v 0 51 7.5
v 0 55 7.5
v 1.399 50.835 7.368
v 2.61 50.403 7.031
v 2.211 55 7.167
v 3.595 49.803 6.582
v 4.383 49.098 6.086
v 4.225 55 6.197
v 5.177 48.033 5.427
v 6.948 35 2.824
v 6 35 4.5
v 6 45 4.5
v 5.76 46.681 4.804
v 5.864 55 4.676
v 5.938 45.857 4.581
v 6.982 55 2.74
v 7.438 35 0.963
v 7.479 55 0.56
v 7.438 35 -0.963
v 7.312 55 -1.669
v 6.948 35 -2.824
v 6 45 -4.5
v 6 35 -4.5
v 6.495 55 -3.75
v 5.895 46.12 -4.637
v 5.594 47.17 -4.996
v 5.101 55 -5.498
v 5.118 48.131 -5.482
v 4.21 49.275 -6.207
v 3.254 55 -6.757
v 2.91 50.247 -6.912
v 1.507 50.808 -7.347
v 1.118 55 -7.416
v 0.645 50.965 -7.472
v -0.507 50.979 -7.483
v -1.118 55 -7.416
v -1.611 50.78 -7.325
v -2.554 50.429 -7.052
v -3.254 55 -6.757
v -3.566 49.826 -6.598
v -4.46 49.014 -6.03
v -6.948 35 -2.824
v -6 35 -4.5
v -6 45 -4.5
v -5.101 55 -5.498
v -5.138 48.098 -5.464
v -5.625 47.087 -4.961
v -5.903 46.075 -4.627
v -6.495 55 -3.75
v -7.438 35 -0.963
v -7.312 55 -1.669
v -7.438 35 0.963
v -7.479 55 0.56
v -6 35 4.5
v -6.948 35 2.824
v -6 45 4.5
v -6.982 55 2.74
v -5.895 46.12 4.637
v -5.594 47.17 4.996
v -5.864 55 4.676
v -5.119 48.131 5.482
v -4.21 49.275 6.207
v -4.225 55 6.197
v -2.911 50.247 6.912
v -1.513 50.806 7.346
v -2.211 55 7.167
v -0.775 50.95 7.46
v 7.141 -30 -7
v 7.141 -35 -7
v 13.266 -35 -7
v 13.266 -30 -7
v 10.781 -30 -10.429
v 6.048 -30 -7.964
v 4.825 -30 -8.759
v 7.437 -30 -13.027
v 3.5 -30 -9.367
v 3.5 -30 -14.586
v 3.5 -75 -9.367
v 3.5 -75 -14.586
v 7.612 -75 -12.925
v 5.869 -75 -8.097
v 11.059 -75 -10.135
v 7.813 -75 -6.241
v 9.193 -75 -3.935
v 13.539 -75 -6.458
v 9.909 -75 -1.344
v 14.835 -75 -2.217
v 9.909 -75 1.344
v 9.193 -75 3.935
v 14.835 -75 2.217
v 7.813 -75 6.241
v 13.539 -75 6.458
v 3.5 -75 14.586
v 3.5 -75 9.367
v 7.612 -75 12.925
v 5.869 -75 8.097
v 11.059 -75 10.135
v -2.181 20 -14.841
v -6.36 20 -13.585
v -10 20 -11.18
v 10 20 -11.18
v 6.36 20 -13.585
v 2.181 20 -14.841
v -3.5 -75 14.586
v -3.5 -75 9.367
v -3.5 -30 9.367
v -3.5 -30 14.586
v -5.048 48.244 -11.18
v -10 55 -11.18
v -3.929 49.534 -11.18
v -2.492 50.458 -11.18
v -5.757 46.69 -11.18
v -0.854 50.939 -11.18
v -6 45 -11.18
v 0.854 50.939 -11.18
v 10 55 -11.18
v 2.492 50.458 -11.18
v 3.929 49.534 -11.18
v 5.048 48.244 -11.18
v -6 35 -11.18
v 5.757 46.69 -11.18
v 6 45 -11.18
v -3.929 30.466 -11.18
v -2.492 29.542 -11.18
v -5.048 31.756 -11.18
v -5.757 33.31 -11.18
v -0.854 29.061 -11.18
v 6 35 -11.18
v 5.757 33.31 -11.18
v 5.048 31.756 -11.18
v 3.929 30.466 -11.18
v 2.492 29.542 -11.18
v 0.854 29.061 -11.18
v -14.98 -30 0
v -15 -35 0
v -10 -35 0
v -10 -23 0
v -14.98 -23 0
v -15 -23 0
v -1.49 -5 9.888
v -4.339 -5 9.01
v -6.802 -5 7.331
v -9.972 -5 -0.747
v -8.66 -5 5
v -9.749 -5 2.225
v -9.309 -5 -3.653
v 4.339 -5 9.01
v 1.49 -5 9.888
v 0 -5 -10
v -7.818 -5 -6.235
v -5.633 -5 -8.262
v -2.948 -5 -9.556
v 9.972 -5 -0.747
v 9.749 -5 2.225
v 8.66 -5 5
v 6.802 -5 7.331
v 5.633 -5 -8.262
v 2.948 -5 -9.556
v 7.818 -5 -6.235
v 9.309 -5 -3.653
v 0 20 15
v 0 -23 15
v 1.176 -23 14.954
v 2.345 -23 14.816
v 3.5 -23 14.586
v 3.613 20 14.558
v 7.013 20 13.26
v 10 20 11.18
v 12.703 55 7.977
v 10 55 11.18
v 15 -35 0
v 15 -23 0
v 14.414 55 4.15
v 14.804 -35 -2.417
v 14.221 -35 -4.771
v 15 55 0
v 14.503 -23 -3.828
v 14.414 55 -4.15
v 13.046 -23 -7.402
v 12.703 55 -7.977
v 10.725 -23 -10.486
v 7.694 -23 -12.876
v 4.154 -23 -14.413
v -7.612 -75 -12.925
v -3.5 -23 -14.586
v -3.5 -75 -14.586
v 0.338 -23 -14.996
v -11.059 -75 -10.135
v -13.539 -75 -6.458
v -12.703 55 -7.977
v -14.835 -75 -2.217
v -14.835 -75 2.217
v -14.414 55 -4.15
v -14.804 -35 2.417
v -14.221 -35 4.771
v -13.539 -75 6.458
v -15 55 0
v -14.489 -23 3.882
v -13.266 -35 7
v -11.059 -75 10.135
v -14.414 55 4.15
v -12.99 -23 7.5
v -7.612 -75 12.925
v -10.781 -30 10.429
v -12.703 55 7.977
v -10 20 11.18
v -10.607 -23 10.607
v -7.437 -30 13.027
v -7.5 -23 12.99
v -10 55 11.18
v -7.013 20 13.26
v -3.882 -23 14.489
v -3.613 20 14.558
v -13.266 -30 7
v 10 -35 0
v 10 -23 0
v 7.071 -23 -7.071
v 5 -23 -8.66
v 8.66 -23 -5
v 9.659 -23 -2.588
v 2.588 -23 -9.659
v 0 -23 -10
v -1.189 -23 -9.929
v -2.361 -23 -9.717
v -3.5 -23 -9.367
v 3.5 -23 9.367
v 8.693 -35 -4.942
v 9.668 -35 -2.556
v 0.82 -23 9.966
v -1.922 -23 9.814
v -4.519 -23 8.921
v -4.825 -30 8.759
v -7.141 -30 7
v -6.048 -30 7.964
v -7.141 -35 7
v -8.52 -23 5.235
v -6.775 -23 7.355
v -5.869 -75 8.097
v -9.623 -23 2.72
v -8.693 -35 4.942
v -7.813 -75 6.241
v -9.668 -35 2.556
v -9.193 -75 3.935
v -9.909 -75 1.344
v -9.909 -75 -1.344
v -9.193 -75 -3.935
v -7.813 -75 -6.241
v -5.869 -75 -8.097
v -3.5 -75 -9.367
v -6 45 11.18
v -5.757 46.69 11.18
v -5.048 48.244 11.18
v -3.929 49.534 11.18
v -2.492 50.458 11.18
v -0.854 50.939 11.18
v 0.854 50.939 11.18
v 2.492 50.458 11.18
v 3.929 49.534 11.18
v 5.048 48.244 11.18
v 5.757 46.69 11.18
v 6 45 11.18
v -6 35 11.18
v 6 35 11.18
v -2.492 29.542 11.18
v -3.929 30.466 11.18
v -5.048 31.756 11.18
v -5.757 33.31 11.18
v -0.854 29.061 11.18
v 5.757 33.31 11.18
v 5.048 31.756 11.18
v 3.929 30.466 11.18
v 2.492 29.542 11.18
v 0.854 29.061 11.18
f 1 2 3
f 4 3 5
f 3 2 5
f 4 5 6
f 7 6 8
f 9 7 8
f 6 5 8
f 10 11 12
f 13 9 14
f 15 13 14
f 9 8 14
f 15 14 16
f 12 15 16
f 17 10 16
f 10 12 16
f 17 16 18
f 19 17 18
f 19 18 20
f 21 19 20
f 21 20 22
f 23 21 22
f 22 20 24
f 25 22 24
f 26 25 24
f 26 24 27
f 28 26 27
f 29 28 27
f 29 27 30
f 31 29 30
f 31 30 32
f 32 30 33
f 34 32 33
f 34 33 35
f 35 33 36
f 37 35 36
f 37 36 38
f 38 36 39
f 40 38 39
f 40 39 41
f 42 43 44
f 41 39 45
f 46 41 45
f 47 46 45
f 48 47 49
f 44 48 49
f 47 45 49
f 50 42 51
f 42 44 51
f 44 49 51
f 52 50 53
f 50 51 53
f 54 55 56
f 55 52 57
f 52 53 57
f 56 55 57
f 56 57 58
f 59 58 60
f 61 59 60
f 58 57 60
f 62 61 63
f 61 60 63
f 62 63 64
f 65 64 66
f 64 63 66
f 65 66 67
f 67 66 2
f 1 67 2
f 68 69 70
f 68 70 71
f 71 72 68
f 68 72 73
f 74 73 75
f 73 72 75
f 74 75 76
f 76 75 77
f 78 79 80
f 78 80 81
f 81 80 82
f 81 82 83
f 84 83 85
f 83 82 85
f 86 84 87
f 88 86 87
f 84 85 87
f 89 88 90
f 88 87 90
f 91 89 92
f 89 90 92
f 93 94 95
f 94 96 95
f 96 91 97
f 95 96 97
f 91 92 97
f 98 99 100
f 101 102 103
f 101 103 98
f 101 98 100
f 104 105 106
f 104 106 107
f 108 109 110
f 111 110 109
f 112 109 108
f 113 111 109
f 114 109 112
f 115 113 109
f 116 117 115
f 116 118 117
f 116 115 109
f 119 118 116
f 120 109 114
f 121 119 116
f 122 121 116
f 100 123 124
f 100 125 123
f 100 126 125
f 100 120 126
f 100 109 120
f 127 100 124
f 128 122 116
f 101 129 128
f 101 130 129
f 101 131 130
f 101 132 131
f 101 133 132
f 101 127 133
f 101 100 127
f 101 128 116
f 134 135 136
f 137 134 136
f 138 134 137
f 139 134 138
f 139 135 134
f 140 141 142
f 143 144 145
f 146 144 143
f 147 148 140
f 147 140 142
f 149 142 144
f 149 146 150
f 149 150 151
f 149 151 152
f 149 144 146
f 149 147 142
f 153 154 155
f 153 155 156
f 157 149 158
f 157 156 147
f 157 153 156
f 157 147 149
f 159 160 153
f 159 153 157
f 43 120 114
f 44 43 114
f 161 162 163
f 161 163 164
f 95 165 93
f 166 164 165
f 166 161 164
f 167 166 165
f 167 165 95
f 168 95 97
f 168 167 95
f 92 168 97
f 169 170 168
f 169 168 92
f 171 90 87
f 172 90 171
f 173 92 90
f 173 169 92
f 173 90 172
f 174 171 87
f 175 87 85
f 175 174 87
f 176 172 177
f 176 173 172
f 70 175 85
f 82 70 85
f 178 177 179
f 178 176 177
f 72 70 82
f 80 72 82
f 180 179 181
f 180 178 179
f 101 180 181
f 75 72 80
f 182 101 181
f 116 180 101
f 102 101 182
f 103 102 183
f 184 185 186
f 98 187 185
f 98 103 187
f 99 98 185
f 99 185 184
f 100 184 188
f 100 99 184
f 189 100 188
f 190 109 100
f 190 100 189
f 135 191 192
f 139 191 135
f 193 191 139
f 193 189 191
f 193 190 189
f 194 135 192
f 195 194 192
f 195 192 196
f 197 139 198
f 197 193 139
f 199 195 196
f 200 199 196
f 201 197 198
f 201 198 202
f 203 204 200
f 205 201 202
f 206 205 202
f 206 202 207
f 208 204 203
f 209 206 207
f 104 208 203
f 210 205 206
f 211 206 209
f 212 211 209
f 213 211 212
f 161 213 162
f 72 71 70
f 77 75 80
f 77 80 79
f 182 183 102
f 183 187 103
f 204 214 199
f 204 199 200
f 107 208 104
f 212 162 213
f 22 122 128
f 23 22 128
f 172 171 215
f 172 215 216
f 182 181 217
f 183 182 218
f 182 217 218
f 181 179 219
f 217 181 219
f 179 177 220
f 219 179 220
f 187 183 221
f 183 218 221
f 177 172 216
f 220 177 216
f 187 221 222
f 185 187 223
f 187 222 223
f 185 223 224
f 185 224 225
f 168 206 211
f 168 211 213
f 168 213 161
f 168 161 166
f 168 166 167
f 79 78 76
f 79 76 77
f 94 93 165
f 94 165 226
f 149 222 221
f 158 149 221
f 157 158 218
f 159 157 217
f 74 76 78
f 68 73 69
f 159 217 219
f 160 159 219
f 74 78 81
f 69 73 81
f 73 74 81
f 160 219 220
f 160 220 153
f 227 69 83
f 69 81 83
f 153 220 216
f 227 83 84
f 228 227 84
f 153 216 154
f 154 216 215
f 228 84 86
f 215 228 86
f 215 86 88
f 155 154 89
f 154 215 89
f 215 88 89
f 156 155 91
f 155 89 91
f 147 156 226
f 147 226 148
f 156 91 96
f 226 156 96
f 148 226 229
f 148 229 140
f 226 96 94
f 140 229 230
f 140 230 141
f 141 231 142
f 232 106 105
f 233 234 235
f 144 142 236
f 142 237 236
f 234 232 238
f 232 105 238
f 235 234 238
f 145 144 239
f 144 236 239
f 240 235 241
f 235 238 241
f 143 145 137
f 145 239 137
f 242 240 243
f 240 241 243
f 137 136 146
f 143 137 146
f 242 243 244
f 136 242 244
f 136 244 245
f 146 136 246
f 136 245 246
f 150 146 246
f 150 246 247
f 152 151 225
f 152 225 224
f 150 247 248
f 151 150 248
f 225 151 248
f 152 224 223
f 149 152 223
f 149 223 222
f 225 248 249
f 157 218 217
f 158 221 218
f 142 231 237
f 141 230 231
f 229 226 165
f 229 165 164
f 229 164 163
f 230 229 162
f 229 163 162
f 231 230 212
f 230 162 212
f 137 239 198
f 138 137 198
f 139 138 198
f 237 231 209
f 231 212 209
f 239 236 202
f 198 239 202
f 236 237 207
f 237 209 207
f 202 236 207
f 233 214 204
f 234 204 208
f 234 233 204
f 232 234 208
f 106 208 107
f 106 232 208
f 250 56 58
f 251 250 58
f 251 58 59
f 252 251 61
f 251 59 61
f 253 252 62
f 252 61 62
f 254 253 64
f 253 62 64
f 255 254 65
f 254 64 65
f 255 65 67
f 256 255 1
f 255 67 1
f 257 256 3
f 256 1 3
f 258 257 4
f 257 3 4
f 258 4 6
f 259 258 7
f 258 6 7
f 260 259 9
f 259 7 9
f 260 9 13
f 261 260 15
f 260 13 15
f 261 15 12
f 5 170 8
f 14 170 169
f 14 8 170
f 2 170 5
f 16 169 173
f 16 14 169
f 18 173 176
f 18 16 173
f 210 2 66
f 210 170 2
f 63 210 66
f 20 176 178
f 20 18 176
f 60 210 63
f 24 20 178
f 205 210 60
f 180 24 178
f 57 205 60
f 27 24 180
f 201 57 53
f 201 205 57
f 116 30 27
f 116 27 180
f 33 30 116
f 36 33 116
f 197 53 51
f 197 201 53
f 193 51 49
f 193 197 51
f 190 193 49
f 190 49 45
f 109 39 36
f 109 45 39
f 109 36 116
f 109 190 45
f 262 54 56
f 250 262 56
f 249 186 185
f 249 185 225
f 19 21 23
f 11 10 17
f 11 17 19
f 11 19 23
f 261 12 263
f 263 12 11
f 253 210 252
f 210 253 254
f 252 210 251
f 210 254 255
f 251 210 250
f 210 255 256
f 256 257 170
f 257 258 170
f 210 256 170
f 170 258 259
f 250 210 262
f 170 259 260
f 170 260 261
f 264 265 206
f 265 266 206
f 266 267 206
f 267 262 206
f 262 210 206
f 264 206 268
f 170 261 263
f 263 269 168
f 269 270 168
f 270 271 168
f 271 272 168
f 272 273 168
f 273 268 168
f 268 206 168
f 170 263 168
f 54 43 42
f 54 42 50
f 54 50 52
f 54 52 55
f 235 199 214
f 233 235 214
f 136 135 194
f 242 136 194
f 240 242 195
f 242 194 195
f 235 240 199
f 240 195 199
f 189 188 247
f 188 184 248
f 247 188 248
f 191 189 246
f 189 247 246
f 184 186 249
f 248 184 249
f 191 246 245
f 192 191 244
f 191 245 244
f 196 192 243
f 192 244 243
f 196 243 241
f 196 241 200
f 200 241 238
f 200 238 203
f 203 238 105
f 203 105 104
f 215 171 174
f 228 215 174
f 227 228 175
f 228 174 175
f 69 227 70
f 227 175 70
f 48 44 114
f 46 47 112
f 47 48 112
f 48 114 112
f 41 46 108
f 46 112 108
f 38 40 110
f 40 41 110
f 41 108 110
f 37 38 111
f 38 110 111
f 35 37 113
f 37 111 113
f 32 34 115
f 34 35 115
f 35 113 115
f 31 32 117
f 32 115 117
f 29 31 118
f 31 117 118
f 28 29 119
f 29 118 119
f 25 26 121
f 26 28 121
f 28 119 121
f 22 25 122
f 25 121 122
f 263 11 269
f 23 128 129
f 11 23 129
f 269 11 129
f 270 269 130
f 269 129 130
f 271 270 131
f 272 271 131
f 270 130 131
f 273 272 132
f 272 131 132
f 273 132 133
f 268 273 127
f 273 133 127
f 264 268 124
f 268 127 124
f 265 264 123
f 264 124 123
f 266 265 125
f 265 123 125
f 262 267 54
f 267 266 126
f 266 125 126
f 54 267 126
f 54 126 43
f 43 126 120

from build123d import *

# Parameters (mm, degrees)
SKETCH1_R                = 15
BOSS_EXTRUDE1_DEPTH      = 75
CUT_EXTRUDE1_DEPTH       = 52
CUT_EXTRUDE2_DEPTH       = 3.5
SKETCH9_R                = 10
CUT_EXTRUDE12_DEPTH      = 70
SKETCH17_W               = 7
SKETCH17_H               = 12
CUT_EXTRUDE19_DEPTH      = 15
SKETCH19_W               = 7
SKETCH19_H               = 12
CUT_EXTRUDE20_DEPTH      = 15
SKETCH20_R               = 7.5
CUT_EXTRUDE21_DEPTH      = 40
CUT_EXTRUDE25_DEPTH      = 152.492574075
CUT_EXTRUDE25_DEPTH_BACK = 55
SKETCH21_W               = 20
SKETCH21_H               = 7.639320226
CUT_EXTRUDE28_DEPTH      = 152.492574075
CUT_EXTRUDE28_DEPTH_BACK = 10
SKETCH24_R               = 15
SKETCH25_R               = 15
CUT_EXTRUDE29_DEPTH      = 10
CUT_EXTRUDE30_DEPTH      = 81.841883926
CUT_EXTRUDE30_DEPTH_BACK = 81.841883926


with BuildPart() as part:
    # Sketch1 → Boss-Extrude1 (new, symmetric)
    with BuildSketch(Plane(origin=(0, 0, 0), x_dir=(1, 0, 0), z_dir=(0, 1, 0))):
        with Locations(Location((0, 0, 0), (0, 0, 270))):
            Circle(SKETCH1_R)
    extrude(amount=BOSS_EXTRUDE1_DEPTH, both=True)

    # Sketch2 → Cut-Extrude1 (cut)
    with BuildSketch(Plane.XZ.offset(75)):
        with BuildLine():
            Line((3.5, 15), (3.5, -15))
            ThreePointArc((3.5, -15), (0, -18.5), (-3.5, -15))
            Line((-3.5, -15), (-3.5, 15))
            ThreePointArc((-3.5, 15), (0, 18.5), (3.5, 15))
        make_face()
    extrude(amount=-CUT_EXTRUDE1_DEPTH, mode=Mode.SUBTRACT)

    # Sketch3 → Cut-Extrude2 (cut, symmetric)
    with BuildSketch(Plane(origin=(0, -26.5, 0), x_dir=(1, 0, 0), z_dir=(0, 1, 0))):
        Polygon((-14.980069936, 0), (-15.328117643, -9.993941304), (-0.348047707, -16.993941304), (0, -7), align=None)
        Polygon((15, 0), (0, 7), (0.348047707, 16.993941304), (15.348047707, 9.993941304), align=None)
    extrude(amount=CUT_EXTRUDE2_DEPTH, both=True, mode=Mode.SUBTRACT)

    # Sketch9 → Cut-Extrude12 (cut)
    with BuildSketch(Plane.XZ.offset(75)):
        with Locations(Location((0, 0, 0), (0, 0, 270))):
            Circle(SKETCH9_R)
    extrude(amount=-CUT_EXTRUDE12_DEPTH, mode=Mode.SUBTRACT)

    # Sketch17 → Cut-Extrude19 (cut)
    with BuildSketch(Plane(origin=(15, 0, 0), x_dir=(0, 0, -1), z_dir=(1, 0, 0))):
        with Locations((3.5, -29)):
            Rectangle(SKETCH17_W, SKETCH17_H)
    extrude(amount=-CUT_EXTRUDE19_DEPTH, mode=Mode.SUBTRACT)

    # Sketch19 → Cut-Extrude20 (cut)
    with BuildSketch(Plane.ZY.offset(15)):
        with Locations((3.5, -29)):
            Rectangle(SKETCH19_W, SKETCH19_H)
    extrude(amount=-CUT_EXTRUDE20_DEPTH, mode=Mode.SUBTRACT)

    # Sketch20 → Cut-Extrude21 (cut)
    with BuildSketch(Plane(origin=(0, 75, 0), x_dir=(1, 0, 0), z_dir=(0, 1, 0))):
        with Locations(Location((0, 0, 0), (0, 0, 270))):
            Circle(SKETCH20_R)
    extrude(amount=-CUT_EXTRUDE21_DEPTH, mode=Mode.SUBTRACT)

    # Sketch21 → Cut-Extrude25 (cut, two sides: drawn at the far end of the back side and taken through both)
    with BuildSketch(Plane(origin=(0, 75, 0), x_dir=(1, 0, 0), z_dir=(0, 1, 0)).offset(-CUT_EXTRUDE25_DEPTH_BACK)):
        with Locations((0, 15)):
            Rectangle(SKETCH21_W, SKETCH21_H)
        with Locations((0, -15)):
            Rectangle(SKETCH21_W, SKETCH21_H)
    extrude(amount=CUT_EXTRUDE25_DEPTH + CUT_EXTRUDE25_DEPTH_BACK, mode=Mode.SUBTRACT)

    # Sketch24 → Cut-Extrude28 (cut, two sides: drawn at the far end of the back side and taken through both)
    with BuildSketch(Plane(origin=(0, 75, 0), x_dir=(1, 0, 0), z_dir=(0, 1, 0)).offset(-CUT_EXTRUDE28_DEPTH_BACK)):
        with Locations(Location((0, 0, 0), (0, 0, 76.506601178))):
            Circle(SKETCH24_R)
    extrude(amount=CUT_EXTRUDE28_DEPTH + CUT_EXTRUDE28_DEPTH_BACK, mode=Mode.SUBTRACT)

    # Sketch25 → Cut-Extrude29 (cut)
    with BuildSketch(Plane(origin=(0, 65, 0), x_dir=(1, 0, 0), z_dir=(0, 1, 0))):
        with Locations(Location((0, 0, 0), (0, 0, 76.506601178))):
            Circle(SKETCH25_R)
    extrude(amount=-CUT_EXTRUDE29_DEPTH, mode=Mode.SUBTRACT)

    # Sketch26 → Cut-Extrude30 (cut, two sides: drawn at the far end of the back side and taken through both)
    with BuildSketch(Plane.XY.offset(11.180339887).offset(-CUT_EXTRUDE30_DEPTH_BACK)):
        with BuildLine():
            Line((6, 45), (6, 35))
            ThreePointArc((6, 35), (0, 29), (-6, 35))
            Line((-6, 35), (-6, 45))
            ThreePointArc((-6, 45), (0, 51), (6, 45))
        make_face()
    extrude(amount=CUT_EXTRUDE30_DEPTH + CUT_EXTRUDE30_DEPTH_BACK, mode=Mode.SUBTRACT)


solid = part.part
